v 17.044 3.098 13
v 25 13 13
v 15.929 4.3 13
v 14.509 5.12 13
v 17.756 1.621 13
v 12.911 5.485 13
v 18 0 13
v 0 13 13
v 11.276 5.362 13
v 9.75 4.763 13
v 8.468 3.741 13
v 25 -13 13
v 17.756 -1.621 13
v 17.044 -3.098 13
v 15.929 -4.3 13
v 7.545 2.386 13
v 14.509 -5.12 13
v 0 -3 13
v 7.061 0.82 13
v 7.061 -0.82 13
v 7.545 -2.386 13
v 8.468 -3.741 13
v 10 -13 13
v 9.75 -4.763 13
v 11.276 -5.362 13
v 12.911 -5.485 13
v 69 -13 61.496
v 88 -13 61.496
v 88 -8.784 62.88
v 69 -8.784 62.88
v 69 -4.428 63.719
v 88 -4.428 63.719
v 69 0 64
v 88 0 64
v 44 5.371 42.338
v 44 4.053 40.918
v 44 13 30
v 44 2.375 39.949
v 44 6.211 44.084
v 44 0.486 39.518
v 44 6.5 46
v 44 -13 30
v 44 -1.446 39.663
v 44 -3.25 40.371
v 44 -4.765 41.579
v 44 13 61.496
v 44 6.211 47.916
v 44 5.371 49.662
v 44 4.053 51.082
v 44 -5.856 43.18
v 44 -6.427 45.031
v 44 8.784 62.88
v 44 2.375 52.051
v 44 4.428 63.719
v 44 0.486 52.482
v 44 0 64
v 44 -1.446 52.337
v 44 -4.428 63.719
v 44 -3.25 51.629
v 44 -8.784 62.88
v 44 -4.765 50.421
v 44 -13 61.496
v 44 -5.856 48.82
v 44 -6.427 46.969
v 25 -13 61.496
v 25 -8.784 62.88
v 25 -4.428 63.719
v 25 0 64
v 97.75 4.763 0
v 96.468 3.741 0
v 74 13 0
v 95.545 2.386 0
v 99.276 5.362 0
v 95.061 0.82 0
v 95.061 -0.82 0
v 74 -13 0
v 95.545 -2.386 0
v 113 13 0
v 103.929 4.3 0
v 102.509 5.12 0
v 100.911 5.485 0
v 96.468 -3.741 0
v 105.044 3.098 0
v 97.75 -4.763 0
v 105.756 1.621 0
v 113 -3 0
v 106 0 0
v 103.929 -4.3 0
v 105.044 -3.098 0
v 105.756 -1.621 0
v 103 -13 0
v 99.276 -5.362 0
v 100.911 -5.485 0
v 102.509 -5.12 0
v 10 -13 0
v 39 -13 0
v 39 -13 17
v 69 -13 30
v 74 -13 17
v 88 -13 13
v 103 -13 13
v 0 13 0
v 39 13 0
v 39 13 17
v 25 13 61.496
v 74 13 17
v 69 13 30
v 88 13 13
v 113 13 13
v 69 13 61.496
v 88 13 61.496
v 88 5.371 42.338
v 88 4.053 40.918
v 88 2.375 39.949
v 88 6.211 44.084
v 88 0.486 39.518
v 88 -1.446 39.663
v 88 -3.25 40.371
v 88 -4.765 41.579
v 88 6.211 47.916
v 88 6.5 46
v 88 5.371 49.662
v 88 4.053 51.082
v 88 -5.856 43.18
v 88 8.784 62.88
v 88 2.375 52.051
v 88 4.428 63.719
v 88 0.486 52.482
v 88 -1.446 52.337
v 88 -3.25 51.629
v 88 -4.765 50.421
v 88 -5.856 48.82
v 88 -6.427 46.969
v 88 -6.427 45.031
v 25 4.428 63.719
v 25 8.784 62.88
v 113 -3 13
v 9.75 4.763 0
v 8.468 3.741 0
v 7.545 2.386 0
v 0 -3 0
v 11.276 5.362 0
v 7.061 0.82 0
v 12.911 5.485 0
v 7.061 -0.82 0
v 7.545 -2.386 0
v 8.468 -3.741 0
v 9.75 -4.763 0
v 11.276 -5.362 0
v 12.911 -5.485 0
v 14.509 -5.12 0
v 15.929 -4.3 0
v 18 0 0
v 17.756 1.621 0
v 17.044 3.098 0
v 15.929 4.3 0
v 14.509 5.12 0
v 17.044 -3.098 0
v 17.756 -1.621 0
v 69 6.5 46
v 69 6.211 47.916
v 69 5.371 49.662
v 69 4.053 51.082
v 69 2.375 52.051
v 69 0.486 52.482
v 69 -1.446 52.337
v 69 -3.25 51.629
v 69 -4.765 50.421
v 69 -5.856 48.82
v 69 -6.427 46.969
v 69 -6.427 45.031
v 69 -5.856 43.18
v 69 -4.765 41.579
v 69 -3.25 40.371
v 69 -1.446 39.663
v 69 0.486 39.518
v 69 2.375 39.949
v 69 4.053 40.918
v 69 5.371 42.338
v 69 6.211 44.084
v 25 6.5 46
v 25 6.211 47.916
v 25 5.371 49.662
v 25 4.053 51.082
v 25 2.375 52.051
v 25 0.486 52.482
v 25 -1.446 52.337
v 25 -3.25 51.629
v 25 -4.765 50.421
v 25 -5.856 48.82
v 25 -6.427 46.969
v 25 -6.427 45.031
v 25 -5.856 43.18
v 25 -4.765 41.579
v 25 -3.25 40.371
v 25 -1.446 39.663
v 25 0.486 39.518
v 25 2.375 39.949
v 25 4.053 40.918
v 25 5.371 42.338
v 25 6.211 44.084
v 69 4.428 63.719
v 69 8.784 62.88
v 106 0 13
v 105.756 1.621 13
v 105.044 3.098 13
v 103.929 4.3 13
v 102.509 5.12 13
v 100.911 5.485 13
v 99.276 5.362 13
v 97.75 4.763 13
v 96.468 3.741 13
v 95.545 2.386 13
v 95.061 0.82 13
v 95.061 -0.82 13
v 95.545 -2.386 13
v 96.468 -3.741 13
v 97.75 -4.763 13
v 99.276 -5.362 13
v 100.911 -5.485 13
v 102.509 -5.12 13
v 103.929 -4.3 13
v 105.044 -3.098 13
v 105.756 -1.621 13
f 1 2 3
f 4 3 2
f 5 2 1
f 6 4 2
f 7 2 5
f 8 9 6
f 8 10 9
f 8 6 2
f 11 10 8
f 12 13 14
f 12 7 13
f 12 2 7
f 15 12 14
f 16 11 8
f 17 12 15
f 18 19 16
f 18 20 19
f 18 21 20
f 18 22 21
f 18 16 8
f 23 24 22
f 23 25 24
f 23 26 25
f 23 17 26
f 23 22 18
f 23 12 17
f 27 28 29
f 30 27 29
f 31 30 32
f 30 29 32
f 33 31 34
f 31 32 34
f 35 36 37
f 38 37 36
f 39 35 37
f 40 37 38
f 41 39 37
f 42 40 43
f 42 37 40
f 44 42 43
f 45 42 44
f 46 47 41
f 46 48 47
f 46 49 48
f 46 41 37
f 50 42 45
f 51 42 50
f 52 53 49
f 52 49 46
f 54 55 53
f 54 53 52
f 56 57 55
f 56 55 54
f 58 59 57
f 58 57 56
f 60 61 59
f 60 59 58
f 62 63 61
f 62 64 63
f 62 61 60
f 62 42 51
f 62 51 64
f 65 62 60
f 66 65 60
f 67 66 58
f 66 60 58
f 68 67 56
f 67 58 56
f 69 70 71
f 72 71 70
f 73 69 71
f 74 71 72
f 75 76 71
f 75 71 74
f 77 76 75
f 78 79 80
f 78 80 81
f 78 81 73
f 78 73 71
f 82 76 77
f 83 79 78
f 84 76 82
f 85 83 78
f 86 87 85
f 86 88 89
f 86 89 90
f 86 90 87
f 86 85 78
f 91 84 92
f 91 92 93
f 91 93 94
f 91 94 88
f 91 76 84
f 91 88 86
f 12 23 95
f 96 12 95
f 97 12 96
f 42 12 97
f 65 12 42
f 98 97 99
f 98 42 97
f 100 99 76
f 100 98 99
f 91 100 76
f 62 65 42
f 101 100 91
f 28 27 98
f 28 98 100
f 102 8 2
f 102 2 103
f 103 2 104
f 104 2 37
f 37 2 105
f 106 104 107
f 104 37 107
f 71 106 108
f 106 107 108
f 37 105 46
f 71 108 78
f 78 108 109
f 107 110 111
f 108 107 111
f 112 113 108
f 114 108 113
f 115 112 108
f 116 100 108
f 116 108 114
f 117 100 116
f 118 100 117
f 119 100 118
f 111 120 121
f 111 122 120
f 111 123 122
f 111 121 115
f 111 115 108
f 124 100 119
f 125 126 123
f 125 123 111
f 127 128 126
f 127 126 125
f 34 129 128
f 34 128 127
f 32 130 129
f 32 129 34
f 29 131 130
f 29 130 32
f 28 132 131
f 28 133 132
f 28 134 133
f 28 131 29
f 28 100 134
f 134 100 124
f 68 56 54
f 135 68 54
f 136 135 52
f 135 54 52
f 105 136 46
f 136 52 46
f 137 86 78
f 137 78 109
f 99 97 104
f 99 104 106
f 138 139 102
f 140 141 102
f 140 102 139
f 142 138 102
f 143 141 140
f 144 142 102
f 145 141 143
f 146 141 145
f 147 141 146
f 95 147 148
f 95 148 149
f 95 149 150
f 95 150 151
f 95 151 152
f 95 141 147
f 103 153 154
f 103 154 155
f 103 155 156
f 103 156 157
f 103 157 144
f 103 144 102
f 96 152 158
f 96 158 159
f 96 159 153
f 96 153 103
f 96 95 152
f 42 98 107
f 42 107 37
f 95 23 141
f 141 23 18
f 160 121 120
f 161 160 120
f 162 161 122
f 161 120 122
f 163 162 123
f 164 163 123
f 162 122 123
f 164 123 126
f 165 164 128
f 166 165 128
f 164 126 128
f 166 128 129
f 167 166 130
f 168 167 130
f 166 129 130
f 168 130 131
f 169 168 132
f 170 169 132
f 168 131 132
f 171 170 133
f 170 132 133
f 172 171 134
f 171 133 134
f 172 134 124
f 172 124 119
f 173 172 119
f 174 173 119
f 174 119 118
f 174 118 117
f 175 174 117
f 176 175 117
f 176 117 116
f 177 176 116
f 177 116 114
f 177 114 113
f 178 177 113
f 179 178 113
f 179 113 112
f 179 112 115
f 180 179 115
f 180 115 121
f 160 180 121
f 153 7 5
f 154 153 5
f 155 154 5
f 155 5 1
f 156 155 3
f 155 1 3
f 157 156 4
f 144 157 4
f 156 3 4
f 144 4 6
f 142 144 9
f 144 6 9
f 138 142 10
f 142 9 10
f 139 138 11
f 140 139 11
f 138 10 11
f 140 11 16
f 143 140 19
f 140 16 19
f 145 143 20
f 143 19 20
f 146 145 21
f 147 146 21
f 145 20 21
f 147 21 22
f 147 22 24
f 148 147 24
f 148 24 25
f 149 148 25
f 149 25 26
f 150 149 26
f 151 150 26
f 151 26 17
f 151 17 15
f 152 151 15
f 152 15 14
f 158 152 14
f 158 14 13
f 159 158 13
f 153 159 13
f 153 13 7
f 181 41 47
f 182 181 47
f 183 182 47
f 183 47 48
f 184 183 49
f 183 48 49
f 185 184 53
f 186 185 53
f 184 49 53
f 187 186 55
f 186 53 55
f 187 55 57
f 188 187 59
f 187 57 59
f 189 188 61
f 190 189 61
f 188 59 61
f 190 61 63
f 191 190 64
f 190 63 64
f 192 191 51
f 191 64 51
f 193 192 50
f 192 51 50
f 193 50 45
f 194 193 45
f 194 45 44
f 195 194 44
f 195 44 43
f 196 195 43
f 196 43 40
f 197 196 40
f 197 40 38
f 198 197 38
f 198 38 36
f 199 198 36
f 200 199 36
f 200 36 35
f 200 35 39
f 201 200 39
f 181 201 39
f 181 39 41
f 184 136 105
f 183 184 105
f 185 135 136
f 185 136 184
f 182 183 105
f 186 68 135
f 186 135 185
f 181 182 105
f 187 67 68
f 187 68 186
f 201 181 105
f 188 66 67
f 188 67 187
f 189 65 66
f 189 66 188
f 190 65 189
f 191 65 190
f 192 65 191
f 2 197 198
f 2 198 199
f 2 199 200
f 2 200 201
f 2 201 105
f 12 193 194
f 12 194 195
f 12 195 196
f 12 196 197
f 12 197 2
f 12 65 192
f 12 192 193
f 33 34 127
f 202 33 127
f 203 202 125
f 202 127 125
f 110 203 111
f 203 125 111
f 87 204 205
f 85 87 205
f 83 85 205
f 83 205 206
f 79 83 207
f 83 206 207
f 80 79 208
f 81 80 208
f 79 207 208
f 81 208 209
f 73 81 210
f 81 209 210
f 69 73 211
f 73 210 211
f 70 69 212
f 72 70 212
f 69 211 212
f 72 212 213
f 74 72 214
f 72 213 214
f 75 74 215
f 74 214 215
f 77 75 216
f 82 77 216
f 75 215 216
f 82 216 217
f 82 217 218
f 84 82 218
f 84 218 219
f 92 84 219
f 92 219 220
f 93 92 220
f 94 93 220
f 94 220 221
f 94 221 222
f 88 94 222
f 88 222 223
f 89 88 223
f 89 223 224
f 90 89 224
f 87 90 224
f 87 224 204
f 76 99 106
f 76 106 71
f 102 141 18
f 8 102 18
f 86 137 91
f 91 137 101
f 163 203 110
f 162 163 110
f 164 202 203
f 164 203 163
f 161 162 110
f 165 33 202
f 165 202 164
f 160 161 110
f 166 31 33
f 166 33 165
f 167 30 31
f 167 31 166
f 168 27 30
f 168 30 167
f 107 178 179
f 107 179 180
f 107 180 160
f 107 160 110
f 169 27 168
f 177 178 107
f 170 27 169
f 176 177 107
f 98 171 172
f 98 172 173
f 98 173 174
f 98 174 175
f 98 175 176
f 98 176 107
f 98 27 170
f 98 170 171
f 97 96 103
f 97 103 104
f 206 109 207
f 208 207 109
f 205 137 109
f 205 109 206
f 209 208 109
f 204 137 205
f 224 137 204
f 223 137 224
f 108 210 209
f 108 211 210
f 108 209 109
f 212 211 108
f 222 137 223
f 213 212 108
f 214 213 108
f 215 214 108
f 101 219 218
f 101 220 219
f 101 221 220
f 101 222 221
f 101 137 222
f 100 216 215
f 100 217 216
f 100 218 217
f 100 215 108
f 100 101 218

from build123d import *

# Parameters (mm, degrees)
F0_W     = 10
F0_H     = 13
F1_DEPTH = 13
F2_R     = 5.5
F3_DEPTH = 13.001
F4_R     = 5.5
F5_DEPTH = 13.001
F6_R     = 6.5
F7_DEPTH = 88.001
F8_DEPTH = 88.001


with BuildPart() as f1:
    # F0 (on Front) → F1 (new body, symmetric)
    with BuildSketch(Plane.XZ):
        with Locations((5, 6.5)):
            Rectangle(F0_W, F0_H)
        Polygon((10, 13), (10, 0), (39, 0), (39, 17), (74, 17), (74, 0), (103, 0), (103, 13), (88, 13), (88, 64), (69, 64), (69, 30), (44, 30), (44, 64), (25, 64), (25, 13), align=None)
        with Locations((108, 6.5)):
            Rectangle(F0_W, F0_H)
    extrude(amount=F1_DEPTH, both=True)

    # F2 (on face) → F3 (cut, through all)
    with BuildSketch(Plane.XY.offset(13)):
        Polygon((0, -13), (10, -13), (0, -3), align=None)
        with Locations((12.5, 0)):
            Circle(F2_R)
    extrude(amount=-F3_DEPTH, mode=Mode.SUBTRACT)

    # F4 (on face) → F5 (cut, through all)
    with BuildSketch(Plane.XY.offset(13)):
        with Locations((100.5, 0)):
            Circle(F4_R)
        Polygon((113, -3), (103, -13), (113, -13), align=None)
    extrude(amount=-F5_DEPTH, mode=Mode.SUBTRACT)

    # F6 (on face) → F7 (cut, through all)
    with BuildSketch(Plane.YZ.offset(88)):
        with Locations((0, 46)):
            Circle(F6_R)
    extrude(amount=-F7_DEPTH, mode=Mode.SUBTRACT)

    # F6 (on face) → F8 (cut, through all)
    with BuildSketch(Plane.YZ.offset(88)):
        with BuildLine():
            Line((13, 64), (0, 64))
            ThreePointArc((0, 64), (6.619465, 63.368338), (13, 61.496154))
            Line((13, 61.496154), (13, 64))
        make_face()
        with BuildLine():
            ThreePointArc((-13, 61.496154), (-6.619465, 63.368338), (0, 64))
            Line((0, 64), (-13, 64))
            Line((-13, 64), (-13, 61.496154))
        make_face()
    extrude(amount=-F8_DEPTH, mode=Mode.SUBTRACT)


solid = f1.part
